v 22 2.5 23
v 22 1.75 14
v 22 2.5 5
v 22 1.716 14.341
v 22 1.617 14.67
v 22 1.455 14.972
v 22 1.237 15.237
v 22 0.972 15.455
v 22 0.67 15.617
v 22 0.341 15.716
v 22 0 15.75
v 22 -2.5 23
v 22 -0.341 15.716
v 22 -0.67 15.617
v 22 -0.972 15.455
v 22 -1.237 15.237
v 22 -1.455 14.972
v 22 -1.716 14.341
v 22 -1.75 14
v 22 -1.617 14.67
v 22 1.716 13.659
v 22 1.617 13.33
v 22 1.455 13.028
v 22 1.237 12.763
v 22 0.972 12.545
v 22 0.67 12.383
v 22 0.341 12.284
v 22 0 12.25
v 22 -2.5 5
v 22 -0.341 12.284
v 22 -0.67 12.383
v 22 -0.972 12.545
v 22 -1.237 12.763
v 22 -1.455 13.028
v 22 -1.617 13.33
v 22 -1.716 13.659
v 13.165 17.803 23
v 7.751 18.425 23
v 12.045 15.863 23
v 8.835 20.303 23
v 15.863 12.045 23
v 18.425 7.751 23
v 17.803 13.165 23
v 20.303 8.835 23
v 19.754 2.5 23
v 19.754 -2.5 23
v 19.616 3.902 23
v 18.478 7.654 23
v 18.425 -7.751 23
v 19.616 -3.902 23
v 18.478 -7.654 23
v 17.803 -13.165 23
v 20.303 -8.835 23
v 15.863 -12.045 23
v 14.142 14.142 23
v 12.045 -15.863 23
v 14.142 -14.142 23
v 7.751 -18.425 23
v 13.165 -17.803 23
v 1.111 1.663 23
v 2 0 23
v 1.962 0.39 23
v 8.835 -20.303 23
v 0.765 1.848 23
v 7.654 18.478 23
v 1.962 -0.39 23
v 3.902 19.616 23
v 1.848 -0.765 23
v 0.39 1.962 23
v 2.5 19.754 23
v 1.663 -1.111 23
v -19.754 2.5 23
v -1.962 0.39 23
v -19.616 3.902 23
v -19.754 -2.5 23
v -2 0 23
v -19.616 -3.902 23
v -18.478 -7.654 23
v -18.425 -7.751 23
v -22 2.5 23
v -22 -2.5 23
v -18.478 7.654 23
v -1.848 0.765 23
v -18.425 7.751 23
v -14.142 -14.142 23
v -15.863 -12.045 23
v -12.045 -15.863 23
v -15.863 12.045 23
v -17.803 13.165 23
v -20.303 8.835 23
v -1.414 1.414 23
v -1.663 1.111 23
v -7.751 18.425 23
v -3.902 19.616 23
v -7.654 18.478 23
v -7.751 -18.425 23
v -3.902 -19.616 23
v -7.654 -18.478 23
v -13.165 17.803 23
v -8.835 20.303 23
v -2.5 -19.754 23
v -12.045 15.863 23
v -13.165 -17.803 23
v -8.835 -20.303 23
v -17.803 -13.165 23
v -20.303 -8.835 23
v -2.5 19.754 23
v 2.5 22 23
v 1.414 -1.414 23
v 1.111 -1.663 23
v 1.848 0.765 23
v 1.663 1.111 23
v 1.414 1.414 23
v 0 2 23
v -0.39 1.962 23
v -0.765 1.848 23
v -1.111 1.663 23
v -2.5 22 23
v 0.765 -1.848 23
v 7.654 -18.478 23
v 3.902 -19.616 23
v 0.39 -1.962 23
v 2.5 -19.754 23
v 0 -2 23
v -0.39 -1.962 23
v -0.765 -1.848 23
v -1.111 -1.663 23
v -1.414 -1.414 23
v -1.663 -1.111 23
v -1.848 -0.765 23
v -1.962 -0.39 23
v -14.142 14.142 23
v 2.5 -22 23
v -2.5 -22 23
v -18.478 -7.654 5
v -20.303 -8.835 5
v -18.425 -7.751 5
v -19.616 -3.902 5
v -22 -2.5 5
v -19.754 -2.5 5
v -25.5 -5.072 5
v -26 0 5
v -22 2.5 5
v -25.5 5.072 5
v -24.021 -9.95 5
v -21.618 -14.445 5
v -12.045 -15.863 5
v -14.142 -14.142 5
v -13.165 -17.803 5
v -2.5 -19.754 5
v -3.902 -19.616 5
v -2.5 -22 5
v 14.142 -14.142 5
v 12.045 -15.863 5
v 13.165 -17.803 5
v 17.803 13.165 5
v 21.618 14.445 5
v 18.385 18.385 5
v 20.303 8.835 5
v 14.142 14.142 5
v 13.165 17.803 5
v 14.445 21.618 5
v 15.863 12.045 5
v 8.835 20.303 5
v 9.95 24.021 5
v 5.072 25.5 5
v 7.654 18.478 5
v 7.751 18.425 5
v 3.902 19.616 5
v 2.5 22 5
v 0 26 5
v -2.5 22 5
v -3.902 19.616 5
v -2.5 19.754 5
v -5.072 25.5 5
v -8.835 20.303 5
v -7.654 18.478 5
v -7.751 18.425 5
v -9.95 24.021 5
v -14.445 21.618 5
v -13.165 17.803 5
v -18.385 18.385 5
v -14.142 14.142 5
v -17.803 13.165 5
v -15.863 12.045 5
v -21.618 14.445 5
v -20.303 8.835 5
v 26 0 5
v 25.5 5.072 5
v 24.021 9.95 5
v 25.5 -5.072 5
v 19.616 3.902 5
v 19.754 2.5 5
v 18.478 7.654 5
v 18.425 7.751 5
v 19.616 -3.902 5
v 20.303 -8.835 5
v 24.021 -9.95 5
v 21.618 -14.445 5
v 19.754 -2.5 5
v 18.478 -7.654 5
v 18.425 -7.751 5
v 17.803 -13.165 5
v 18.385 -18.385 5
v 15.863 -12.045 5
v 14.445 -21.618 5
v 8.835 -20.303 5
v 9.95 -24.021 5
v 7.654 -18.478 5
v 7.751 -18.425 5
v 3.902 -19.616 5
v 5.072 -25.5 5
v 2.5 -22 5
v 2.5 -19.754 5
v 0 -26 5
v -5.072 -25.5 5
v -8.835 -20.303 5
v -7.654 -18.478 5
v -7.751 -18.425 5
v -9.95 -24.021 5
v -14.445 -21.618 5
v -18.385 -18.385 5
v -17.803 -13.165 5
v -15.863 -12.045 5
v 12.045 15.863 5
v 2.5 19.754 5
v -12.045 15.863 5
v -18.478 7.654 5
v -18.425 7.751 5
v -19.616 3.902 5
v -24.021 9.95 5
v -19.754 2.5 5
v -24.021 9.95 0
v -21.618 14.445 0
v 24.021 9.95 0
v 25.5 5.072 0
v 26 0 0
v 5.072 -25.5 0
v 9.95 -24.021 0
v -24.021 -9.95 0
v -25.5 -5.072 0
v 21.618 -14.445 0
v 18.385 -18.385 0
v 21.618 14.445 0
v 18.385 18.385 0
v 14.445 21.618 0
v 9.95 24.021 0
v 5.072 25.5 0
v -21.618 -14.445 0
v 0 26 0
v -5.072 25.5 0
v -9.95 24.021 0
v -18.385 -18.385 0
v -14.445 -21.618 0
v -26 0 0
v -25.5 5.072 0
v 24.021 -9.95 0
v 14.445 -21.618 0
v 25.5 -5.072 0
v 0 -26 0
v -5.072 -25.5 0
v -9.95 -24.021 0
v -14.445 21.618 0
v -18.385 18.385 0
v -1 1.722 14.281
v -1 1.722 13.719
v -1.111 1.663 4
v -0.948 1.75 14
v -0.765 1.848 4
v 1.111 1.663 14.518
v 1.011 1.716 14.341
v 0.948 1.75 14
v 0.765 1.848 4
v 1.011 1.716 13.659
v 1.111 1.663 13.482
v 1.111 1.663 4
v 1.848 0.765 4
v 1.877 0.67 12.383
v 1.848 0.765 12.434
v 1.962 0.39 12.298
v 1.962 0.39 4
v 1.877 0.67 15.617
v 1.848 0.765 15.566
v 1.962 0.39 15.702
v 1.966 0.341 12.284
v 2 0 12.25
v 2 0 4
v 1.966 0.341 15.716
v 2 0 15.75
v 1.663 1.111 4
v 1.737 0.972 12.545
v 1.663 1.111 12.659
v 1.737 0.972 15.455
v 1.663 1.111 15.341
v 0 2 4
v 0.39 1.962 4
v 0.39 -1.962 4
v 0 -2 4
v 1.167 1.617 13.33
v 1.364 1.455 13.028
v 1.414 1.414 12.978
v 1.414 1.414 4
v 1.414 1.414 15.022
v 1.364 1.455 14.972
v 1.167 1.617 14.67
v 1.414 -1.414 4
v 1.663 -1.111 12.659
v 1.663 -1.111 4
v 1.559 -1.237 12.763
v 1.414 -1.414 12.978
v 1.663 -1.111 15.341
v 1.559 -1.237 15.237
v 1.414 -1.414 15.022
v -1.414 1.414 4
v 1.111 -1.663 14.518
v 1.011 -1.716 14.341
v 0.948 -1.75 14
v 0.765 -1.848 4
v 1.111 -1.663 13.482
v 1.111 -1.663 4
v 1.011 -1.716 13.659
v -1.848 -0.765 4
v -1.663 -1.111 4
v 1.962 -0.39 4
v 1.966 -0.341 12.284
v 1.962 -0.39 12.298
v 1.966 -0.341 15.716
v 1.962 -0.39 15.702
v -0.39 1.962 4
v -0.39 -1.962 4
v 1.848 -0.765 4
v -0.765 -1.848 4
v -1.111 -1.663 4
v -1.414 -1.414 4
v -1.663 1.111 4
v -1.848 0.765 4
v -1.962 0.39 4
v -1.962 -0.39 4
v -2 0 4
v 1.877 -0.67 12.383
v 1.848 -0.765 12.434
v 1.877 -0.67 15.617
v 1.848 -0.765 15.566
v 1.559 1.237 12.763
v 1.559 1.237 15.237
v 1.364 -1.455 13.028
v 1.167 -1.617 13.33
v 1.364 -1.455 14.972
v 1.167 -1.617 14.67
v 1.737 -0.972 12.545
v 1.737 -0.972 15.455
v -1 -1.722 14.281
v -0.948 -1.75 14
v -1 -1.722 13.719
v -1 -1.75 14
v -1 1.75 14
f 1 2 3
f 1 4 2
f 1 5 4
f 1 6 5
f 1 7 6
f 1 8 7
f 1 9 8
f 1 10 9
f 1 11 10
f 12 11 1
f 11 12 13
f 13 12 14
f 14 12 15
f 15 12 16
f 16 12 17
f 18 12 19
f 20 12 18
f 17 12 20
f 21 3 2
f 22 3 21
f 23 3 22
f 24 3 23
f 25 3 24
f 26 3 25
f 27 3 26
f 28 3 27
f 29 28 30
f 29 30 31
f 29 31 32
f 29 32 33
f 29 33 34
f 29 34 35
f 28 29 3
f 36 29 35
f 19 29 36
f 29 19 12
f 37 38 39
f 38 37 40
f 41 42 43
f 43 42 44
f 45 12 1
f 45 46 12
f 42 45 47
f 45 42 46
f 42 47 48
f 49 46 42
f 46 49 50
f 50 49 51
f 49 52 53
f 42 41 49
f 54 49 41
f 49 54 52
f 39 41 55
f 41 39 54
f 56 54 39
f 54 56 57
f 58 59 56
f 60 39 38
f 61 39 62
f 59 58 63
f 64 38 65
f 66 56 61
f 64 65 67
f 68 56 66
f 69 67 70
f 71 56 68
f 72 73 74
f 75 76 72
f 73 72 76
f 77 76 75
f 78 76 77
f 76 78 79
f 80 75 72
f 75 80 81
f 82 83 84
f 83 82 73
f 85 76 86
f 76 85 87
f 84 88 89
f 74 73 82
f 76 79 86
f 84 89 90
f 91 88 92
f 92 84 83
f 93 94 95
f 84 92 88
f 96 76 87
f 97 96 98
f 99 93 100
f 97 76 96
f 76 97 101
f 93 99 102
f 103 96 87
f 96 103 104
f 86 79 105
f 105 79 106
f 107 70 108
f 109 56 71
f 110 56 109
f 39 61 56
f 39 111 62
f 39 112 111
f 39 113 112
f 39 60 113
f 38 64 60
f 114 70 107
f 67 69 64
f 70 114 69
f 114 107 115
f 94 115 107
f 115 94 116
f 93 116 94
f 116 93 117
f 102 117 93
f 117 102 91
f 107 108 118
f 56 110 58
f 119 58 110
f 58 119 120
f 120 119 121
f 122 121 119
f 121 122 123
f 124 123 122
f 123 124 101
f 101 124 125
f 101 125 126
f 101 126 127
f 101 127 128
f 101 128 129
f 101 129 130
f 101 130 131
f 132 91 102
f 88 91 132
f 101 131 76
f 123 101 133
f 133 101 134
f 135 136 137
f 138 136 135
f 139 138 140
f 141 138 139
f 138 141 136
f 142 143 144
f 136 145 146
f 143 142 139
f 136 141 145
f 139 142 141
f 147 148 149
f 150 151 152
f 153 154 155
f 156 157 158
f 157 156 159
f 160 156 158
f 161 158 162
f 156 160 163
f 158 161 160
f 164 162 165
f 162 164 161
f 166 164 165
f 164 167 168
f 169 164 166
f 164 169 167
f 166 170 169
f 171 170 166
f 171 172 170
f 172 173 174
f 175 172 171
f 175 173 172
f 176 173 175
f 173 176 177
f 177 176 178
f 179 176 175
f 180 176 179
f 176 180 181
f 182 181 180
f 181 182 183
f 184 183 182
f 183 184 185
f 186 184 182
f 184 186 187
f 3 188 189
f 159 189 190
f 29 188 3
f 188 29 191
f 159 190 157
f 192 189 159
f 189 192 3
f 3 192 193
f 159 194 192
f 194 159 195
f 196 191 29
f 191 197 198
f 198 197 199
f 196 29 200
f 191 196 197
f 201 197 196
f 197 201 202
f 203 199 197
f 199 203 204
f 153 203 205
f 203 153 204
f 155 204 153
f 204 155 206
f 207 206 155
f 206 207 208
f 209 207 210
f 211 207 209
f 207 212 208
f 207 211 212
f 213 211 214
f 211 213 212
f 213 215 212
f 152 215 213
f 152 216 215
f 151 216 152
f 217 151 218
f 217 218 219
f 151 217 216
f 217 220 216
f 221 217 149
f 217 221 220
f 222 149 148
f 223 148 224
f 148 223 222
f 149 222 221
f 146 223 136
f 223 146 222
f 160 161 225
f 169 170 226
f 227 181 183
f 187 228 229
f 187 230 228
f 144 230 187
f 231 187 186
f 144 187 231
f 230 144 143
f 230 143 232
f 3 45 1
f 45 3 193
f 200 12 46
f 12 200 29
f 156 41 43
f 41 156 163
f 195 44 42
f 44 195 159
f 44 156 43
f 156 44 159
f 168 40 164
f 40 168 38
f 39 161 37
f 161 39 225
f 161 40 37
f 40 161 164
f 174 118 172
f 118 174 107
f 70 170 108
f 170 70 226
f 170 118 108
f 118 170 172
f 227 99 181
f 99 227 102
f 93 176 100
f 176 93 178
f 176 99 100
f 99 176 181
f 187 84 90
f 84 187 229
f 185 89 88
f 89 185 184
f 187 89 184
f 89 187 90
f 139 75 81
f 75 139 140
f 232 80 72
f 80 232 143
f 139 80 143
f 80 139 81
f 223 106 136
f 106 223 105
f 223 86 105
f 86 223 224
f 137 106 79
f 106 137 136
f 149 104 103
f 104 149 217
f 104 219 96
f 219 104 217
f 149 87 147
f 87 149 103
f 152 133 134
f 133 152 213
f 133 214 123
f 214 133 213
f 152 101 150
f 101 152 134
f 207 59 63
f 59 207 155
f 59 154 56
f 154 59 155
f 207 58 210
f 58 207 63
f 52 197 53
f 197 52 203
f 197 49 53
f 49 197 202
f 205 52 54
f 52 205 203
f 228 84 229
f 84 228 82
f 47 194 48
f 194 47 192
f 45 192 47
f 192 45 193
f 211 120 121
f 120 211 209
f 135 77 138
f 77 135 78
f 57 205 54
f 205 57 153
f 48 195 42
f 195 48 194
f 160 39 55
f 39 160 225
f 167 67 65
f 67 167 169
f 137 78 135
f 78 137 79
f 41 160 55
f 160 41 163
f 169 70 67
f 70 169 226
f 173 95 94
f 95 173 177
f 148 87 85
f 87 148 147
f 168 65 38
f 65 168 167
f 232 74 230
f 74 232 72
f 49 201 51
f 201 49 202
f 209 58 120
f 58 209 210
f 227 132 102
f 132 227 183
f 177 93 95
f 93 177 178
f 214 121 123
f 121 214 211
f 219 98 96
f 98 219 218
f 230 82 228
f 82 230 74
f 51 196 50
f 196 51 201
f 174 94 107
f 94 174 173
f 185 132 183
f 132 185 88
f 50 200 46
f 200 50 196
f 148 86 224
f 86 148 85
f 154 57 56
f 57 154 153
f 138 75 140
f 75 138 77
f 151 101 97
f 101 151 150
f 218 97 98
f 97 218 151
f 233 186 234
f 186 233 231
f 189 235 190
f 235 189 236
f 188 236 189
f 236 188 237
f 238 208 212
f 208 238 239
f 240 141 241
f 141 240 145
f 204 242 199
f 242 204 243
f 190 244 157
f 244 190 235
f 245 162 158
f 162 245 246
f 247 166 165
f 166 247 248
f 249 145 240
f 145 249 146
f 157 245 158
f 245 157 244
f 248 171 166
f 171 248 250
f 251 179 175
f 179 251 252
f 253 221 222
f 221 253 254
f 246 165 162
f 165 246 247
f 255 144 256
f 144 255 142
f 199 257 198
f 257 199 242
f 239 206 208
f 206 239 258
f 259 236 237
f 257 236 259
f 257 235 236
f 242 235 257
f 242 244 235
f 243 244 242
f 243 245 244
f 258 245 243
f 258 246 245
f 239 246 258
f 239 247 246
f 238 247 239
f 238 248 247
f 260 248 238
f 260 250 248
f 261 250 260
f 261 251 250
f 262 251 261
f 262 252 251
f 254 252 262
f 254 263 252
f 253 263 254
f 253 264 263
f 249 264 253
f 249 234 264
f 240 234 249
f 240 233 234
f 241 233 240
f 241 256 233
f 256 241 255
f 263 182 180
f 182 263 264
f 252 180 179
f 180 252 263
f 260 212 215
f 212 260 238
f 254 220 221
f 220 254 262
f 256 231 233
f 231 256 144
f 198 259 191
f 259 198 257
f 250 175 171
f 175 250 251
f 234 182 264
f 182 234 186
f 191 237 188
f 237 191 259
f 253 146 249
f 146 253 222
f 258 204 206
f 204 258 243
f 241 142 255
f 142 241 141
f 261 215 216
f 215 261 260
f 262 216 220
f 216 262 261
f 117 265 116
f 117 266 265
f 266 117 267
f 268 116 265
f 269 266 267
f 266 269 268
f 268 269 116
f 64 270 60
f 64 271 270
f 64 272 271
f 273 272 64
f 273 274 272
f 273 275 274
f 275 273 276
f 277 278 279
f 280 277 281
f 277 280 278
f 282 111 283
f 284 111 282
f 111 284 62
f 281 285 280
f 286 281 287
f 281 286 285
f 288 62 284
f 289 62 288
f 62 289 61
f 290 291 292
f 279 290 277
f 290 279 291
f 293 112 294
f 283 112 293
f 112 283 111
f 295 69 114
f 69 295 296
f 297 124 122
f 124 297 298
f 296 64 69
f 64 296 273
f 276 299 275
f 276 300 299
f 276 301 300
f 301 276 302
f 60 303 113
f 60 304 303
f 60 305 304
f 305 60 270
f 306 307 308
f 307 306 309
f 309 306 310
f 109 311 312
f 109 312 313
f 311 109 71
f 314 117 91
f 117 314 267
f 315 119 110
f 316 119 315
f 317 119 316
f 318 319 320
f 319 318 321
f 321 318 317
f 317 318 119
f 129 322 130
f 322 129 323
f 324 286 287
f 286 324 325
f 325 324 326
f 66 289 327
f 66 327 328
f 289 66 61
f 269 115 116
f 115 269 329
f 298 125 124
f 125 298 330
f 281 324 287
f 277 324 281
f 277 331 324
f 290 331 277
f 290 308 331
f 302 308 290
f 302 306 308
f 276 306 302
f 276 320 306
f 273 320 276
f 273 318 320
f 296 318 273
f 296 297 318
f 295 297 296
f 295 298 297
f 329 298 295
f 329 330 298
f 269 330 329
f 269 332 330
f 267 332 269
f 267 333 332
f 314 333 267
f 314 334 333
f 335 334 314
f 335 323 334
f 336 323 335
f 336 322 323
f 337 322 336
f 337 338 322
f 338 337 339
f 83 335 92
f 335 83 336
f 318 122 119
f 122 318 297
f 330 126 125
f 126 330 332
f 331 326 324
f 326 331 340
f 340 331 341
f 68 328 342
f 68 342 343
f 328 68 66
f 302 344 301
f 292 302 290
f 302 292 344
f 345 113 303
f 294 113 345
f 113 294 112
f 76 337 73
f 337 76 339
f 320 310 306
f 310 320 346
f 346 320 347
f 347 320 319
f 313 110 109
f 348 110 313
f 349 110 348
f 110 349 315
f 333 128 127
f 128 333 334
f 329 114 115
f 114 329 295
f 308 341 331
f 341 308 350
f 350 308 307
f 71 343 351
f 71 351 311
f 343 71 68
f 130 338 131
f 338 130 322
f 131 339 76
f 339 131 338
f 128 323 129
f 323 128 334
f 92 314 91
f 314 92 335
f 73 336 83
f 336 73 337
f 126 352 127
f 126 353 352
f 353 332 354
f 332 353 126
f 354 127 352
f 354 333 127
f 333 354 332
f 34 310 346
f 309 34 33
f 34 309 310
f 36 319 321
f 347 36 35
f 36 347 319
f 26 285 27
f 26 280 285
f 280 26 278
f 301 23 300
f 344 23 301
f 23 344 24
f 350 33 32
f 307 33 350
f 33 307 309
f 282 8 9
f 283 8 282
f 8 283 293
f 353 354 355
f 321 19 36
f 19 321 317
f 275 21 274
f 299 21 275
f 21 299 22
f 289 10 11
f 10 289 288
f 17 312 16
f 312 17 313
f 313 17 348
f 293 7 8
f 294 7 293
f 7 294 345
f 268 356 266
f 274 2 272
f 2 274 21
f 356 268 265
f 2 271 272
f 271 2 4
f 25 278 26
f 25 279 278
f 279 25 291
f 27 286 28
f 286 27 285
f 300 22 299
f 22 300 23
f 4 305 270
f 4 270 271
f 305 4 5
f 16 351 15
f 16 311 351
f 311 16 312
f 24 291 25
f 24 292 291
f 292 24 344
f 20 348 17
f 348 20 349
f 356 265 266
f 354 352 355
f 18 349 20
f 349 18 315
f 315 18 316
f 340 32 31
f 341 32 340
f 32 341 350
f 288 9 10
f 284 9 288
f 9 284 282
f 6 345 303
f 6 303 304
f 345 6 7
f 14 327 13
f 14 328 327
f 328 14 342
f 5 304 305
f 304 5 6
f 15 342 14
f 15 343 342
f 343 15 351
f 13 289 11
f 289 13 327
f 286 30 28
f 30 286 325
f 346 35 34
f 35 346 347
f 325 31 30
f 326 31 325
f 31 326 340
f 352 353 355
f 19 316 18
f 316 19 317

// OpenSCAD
$fn = 32;

// ----------------------------------------------------------------------
// Control knob: skirt knob with grip ribs
// ----------------------------------------------------------------------

// --- parameters (mm) ---
skirt_d = 52;             // skirt diameter
skirt_t = 5;              // skirt thickness
rib_w = 5;                // grip rib width
rib_out = 3;              // grip rib radial protrusion
n_ribs = 12;              // number of grip ribs
knob_d = 40;              // knob body diameter
knob_h = 18;              // knob body height
bore_d = 4;               // shaft bore diameter
set_d = 3.5;              // set screw bore diameter

rib_step = 360 / n_ribs;  // rib angular step
total_h = skirt_t + knob_h;  // overall height

difference() {
  union() {
    translate([0, 0, skirt_t]) cylinder(h = knob_h, d = knob_d);
    cylinder(h = skirt_t, d = skirt_d);
    for (i = [0 : n_ribs - 1])
      rotate([0, 0, i * rib_step])
        translate([knob_d / 2 - 1, -rib_w / 2, skirt_t])
          cube([rib_out, rib_w, knob_h]);
  }
  translate([0, 0, skirt_t - 1]) cylinder(h = knob_h + 2, d = bore_d);
  translate([-1, 0, skirt_t + knob_h / 2]) rotate([0, 90, 0])
    cylinder(h = knob_d / 2 + bore_d / 2 + 2, d = set_d);
}
